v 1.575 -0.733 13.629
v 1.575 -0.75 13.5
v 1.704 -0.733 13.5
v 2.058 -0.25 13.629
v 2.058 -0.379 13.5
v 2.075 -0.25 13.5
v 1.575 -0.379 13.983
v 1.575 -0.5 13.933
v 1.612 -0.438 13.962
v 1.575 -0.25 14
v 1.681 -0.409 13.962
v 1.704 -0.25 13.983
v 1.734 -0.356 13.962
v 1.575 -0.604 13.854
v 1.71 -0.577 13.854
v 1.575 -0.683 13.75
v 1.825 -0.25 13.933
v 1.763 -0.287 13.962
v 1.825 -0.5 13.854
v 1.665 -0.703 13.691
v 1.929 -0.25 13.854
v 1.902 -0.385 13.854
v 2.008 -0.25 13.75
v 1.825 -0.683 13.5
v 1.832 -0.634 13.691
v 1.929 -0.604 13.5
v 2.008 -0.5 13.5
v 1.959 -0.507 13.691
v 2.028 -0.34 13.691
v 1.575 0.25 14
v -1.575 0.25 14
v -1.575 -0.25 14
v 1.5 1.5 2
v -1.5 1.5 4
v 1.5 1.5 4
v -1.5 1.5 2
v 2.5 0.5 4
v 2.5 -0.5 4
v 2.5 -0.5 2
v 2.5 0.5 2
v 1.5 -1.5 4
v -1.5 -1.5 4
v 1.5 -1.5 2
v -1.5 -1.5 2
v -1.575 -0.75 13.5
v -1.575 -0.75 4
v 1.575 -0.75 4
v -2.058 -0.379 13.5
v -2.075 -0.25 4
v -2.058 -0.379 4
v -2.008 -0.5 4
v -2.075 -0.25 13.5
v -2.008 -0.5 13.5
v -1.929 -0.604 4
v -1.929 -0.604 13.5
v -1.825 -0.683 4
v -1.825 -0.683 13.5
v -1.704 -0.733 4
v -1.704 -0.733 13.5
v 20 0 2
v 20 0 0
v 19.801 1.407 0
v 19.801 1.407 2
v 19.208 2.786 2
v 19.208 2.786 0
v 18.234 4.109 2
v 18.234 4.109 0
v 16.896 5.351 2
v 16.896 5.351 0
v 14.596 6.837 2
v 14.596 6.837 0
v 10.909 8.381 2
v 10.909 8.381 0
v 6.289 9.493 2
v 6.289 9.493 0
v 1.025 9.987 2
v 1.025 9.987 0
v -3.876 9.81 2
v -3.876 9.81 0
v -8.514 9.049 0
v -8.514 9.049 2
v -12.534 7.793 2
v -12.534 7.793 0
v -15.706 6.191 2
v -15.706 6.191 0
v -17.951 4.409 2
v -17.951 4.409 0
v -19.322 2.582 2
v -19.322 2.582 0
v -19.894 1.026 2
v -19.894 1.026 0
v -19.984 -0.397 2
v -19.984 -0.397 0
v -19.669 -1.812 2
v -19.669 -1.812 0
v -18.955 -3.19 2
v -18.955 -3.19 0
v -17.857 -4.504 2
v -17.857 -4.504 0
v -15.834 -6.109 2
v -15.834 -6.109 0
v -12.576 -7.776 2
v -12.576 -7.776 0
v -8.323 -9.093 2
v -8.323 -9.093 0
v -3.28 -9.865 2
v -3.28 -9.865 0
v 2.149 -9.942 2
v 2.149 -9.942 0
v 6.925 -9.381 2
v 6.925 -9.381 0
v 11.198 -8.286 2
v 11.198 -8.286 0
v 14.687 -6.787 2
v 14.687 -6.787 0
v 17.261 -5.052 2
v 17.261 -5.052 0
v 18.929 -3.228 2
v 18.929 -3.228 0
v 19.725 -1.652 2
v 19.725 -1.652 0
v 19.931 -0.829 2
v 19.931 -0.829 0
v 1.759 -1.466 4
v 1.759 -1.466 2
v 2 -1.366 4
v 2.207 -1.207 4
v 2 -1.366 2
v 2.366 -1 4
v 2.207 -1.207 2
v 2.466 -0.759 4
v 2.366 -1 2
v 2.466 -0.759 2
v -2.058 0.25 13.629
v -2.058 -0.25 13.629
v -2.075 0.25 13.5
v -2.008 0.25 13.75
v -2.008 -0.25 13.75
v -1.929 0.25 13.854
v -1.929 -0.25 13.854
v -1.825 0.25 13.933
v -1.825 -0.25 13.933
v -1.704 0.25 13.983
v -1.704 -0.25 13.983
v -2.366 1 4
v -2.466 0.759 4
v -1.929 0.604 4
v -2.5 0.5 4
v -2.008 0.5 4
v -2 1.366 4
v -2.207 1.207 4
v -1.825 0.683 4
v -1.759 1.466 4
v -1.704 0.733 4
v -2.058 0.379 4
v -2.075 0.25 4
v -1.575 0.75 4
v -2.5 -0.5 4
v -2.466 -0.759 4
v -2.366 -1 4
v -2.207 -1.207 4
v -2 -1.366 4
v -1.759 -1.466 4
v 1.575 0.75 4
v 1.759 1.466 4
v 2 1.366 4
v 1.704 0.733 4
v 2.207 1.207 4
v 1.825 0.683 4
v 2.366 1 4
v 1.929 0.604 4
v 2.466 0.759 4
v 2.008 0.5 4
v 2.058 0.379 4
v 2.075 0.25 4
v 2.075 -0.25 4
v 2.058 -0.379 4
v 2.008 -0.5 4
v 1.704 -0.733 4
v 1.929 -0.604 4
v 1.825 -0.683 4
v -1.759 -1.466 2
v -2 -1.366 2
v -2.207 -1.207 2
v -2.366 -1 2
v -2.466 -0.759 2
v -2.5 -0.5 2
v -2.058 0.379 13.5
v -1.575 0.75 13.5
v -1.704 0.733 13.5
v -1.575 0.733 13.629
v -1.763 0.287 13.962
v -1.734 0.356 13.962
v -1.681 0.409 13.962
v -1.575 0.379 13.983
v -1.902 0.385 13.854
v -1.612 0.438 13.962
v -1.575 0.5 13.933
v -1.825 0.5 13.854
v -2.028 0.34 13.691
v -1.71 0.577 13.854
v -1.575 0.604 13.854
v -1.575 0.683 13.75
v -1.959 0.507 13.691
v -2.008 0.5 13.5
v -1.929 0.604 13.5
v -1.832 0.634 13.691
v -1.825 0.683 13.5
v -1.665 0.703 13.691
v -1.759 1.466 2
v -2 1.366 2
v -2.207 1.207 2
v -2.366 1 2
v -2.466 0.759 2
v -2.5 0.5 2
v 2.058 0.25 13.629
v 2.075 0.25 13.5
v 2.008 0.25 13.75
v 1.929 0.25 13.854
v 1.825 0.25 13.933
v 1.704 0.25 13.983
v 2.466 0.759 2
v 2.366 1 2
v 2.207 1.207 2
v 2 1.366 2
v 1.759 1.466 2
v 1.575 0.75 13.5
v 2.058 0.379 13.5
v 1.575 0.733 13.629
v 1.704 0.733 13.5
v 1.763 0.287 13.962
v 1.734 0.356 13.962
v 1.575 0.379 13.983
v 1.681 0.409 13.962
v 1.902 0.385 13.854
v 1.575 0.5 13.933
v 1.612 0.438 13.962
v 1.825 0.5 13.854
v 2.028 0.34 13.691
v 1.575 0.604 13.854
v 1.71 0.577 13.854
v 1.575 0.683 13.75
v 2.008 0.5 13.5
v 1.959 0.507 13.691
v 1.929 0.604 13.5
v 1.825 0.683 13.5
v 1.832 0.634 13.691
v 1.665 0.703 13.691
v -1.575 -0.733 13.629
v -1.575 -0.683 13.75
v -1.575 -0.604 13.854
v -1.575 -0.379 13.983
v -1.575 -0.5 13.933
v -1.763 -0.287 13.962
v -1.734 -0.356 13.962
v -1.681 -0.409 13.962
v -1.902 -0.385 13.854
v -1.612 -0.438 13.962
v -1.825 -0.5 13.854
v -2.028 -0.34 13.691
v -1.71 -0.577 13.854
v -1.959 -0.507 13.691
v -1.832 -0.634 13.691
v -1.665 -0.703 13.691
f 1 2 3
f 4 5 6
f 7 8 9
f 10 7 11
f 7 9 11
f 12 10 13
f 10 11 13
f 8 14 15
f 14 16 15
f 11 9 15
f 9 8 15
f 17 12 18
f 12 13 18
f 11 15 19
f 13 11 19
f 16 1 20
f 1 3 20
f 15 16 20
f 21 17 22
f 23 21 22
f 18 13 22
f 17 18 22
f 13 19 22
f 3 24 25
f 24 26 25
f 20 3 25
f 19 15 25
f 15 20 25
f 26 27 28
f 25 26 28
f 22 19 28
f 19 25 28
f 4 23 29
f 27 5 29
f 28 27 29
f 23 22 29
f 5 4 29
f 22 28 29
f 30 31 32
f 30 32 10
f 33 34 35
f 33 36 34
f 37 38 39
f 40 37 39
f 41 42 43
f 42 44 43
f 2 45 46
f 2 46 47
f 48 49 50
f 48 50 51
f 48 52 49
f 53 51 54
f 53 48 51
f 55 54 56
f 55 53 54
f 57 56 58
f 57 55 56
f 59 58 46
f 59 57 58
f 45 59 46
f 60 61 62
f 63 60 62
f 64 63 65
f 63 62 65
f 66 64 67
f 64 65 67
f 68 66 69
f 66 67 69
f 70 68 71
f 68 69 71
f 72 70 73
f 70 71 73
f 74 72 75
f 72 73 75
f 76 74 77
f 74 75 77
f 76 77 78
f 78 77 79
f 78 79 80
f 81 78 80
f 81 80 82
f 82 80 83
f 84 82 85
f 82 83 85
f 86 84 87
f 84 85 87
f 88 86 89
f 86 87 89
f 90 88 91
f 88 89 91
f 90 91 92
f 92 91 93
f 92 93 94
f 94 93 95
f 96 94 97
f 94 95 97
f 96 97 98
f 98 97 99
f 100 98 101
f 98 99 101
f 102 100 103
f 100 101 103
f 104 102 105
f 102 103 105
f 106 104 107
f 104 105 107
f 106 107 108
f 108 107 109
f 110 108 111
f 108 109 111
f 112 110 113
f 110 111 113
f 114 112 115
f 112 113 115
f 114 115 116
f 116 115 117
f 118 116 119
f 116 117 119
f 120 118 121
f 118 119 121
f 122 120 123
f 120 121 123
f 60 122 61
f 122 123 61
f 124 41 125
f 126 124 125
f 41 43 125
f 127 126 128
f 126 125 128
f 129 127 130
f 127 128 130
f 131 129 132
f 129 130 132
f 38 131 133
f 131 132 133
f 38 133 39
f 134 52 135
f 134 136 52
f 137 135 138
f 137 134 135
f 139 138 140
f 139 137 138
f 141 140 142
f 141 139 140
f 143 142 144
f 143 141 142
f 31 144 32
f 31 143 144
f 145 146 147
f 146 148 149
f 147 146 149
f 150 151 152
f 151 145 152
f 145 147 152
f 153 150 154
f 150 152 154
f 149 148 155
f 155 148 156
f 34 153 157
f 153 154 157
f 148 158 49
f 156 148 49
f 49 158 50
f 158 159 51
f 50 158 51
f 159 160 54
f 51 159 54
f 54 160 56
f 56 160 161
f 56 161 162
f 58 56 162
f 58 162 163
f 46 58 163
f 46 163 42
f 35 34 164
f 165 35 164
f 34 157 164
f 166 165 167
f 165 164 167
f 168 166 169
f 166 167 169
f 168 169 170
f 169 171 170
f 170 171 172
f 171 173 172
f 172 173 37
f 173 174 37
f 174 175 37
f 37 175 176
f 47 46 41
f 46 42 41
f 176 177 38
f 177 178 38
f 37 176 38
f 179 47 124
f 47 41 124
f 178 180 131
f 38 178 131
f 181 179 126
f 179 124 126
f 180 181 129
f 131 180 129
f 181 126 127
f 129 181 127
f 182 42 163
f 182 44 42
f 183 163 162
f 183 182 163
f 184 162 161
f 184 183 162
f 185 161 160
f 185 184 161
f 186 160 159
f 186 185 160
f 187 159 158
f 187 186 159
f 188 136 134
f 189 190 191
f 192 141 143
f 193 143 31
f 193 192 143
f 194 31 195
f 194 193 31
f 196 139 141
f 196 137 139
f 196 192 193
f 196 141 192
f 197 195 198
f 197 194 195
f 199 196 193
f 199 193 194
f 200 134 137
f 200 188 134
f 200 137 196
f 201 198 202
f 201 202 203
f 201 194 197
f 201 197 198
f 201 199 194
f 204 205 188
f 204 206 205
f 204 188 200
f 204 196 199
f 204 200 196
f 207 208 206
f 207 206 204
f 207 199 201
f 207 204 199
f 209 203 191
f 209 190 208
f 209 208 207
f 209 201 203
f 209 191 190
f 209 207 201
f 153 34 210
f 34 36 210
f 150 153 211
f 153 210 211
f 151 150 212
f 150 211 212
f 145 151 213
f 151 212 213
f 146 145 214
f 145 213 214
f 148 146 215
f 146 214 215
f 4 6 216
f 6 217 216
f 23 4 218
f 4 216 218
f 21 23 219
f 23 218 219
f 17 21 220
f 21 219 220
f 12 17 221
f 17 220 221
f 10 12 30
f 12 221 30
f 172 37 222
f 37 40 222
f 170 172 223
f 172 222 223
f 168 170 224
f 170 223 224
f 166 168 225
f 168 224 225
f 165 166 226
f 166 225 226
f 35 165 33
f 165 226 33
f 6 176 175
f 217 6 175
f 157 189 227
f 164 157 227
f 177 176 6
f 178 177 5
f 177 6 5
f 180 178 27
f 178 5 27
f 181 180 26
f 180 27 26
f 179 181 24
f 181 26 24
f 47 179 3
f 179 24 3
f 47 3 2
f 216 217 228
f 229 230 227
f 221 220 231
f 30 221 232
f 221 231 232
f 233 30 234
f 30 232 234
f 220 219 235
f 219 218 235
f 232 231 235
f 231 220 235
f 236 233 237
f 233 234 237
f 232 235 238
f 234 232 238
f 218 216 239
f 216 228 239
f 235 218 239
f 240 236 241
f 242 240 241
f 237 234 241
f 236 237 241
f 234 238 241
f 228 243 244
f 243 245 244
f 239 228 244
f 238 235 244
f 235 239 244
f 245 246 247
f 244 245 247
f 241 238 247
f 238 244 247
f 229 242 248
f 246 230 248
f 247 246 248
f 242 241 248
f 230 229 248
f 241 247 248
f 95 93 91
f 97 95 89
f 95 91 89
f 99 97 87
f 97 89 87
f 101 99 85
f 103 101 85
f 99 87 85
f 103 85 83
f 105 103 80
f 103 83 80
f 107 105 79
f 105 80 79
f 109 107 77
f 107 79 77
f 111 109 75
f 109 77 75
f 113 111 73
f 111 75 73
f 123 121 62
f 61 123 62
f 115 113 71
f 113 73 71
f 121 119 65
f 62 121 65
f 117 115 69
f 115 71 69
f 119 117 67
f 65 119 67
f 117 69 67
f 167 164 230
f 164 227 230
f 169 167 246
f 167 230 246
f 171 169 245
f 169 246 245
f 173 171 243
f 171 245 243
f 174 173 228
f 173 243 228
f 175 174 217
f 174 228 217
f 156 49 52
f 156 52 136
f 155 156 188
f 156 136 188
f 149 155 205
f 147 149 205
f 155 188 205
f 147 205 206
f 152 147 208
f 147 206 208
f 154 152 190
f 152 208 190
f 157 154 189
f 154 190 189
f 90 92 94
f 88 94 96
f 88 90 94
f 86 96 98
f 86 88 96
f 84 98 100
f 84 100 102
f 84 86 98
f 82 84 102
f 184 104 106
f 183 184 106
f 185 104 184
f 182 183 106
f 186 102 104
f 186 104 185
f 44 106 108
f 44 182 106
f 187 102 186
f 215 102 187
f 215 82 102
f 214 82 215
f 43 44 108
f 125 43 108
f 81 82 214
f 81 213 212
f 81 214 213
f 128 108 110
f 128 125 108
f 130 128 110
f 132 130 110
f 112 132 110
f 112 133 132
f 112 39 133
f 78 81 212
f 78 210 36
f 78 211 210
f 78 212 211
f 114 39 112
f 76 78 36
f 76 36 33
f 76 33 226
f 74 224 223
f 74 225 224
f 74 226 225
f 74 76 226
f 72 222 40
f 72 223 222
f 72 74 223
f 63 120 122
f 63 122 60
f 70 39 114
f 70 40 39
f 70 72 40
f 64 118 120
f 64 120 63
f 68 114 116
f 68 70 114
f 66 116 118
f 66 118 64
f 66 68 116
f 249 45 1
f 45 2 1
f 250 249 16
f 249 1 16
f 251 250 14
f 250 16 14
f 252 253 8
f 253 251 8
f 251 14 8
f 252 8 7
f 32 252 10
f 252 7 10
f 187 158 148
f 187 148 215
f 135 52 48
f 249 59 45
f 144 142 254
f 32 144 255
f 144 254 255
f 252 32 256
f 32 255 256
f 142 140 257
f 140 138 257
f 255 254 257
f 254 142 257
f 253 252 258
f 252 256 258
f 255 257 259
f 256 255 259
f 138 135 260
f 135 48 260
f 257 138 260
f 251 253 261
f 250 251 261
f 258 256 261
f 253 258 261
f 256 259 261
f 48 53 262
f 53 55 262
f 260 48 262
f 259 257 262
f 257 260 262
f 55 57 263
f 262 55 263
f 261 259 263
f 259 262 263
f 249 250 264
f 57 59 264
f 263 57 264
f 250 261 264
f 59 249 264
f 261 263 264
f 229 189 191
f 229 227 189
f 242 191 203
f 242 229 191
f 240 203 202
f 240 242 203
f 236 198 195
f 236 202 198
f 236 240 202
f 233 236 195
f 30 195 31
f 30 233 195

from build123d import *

# Parameters (mm, degrees)
SKETCH1_RX               = 20
SKETCH1_RY               = 10
BOSS_EXTRUDE1_DEPTH      = 2
BOSS_EXTRUDE2_DEPTH      = 1.5
BOSS_EXTRUDE2_DEPTH_BACK = 1.5
SKETCH2_W                = 5
SKETCH2_H                = 2
SKETCH3_W                = 4.15
SKETCH3_H                = 1.5
BOSS_EXTRUDE3_DEPTH      = 10
FILLET1_R                = 1
FILLET3_R                = 0.5


with BuildPart() as part:
    # Sketch1 → Boss-Extrude1 (new body)
    with BuildSketch(Plane.XY):
        with Locations((0, 0)):
            Ellipse(SKETCH1_RX, SKETCH1_RY)
    extrude(amount=BOSS_EXTRUDE1_DEPTH)

    # Sketch2 → Boss-Extrude2 (add, two sides: drawn at the far end of the back side and taken through both)
    with BuildSketch(Plane(origin=(0, 0, 0), x_dir=(1, 0, 0), z_dir=(0, 1, 0)).offset(-BOSS_EXTRUDE2_DEPTH_BACK)):
        with Locations((0, -3)):
            Rectangle(SKETCH2_W, SKETCH2_H)
    extrude(amount=BOSS_EXTRUDE2_DEPTH + BOSS_EXTRUDE2_DEPTH_BACK)

    # Sketch3 → Boss-Extrude3 (add)
    with BuildSketch(Plane.XY.offset(4)):
        Rectangle(SKETCH3_W, SKETCH3_H)
    extrude(amount=BOSS_EXTRUDE3_DEPTH)

    # Fillet1
    fillet1_edges = [part.edges().sort_by_distance(p)[0] for p in [
        (-2.5, -1.5, 3),
        (2.5, -1.5, 3),
        (-2.5, 1.5, 3),
        (2.5, 1.5, 3),
    ]]
    fillet(fillet1_edges, radius=FILLET1_R)

    # Fillet3
    fillet3_edges = [part.edges().sort_by_distance(p)[0] for p in [
        (-2.075, 0.75, 9),
        (-2.075, -0.75, 9),
        (2.075, -0.75, 9),
        (2.075, 0.75, 9),
        (-2.075, 0, 14),
        (0, -0.75, 14),
        (2.075, 0, 14),
        (0, 0.75, 14),
    ]]
    fillet(fillet3_edges, radius=FILLET3_R)


solid = part.part
